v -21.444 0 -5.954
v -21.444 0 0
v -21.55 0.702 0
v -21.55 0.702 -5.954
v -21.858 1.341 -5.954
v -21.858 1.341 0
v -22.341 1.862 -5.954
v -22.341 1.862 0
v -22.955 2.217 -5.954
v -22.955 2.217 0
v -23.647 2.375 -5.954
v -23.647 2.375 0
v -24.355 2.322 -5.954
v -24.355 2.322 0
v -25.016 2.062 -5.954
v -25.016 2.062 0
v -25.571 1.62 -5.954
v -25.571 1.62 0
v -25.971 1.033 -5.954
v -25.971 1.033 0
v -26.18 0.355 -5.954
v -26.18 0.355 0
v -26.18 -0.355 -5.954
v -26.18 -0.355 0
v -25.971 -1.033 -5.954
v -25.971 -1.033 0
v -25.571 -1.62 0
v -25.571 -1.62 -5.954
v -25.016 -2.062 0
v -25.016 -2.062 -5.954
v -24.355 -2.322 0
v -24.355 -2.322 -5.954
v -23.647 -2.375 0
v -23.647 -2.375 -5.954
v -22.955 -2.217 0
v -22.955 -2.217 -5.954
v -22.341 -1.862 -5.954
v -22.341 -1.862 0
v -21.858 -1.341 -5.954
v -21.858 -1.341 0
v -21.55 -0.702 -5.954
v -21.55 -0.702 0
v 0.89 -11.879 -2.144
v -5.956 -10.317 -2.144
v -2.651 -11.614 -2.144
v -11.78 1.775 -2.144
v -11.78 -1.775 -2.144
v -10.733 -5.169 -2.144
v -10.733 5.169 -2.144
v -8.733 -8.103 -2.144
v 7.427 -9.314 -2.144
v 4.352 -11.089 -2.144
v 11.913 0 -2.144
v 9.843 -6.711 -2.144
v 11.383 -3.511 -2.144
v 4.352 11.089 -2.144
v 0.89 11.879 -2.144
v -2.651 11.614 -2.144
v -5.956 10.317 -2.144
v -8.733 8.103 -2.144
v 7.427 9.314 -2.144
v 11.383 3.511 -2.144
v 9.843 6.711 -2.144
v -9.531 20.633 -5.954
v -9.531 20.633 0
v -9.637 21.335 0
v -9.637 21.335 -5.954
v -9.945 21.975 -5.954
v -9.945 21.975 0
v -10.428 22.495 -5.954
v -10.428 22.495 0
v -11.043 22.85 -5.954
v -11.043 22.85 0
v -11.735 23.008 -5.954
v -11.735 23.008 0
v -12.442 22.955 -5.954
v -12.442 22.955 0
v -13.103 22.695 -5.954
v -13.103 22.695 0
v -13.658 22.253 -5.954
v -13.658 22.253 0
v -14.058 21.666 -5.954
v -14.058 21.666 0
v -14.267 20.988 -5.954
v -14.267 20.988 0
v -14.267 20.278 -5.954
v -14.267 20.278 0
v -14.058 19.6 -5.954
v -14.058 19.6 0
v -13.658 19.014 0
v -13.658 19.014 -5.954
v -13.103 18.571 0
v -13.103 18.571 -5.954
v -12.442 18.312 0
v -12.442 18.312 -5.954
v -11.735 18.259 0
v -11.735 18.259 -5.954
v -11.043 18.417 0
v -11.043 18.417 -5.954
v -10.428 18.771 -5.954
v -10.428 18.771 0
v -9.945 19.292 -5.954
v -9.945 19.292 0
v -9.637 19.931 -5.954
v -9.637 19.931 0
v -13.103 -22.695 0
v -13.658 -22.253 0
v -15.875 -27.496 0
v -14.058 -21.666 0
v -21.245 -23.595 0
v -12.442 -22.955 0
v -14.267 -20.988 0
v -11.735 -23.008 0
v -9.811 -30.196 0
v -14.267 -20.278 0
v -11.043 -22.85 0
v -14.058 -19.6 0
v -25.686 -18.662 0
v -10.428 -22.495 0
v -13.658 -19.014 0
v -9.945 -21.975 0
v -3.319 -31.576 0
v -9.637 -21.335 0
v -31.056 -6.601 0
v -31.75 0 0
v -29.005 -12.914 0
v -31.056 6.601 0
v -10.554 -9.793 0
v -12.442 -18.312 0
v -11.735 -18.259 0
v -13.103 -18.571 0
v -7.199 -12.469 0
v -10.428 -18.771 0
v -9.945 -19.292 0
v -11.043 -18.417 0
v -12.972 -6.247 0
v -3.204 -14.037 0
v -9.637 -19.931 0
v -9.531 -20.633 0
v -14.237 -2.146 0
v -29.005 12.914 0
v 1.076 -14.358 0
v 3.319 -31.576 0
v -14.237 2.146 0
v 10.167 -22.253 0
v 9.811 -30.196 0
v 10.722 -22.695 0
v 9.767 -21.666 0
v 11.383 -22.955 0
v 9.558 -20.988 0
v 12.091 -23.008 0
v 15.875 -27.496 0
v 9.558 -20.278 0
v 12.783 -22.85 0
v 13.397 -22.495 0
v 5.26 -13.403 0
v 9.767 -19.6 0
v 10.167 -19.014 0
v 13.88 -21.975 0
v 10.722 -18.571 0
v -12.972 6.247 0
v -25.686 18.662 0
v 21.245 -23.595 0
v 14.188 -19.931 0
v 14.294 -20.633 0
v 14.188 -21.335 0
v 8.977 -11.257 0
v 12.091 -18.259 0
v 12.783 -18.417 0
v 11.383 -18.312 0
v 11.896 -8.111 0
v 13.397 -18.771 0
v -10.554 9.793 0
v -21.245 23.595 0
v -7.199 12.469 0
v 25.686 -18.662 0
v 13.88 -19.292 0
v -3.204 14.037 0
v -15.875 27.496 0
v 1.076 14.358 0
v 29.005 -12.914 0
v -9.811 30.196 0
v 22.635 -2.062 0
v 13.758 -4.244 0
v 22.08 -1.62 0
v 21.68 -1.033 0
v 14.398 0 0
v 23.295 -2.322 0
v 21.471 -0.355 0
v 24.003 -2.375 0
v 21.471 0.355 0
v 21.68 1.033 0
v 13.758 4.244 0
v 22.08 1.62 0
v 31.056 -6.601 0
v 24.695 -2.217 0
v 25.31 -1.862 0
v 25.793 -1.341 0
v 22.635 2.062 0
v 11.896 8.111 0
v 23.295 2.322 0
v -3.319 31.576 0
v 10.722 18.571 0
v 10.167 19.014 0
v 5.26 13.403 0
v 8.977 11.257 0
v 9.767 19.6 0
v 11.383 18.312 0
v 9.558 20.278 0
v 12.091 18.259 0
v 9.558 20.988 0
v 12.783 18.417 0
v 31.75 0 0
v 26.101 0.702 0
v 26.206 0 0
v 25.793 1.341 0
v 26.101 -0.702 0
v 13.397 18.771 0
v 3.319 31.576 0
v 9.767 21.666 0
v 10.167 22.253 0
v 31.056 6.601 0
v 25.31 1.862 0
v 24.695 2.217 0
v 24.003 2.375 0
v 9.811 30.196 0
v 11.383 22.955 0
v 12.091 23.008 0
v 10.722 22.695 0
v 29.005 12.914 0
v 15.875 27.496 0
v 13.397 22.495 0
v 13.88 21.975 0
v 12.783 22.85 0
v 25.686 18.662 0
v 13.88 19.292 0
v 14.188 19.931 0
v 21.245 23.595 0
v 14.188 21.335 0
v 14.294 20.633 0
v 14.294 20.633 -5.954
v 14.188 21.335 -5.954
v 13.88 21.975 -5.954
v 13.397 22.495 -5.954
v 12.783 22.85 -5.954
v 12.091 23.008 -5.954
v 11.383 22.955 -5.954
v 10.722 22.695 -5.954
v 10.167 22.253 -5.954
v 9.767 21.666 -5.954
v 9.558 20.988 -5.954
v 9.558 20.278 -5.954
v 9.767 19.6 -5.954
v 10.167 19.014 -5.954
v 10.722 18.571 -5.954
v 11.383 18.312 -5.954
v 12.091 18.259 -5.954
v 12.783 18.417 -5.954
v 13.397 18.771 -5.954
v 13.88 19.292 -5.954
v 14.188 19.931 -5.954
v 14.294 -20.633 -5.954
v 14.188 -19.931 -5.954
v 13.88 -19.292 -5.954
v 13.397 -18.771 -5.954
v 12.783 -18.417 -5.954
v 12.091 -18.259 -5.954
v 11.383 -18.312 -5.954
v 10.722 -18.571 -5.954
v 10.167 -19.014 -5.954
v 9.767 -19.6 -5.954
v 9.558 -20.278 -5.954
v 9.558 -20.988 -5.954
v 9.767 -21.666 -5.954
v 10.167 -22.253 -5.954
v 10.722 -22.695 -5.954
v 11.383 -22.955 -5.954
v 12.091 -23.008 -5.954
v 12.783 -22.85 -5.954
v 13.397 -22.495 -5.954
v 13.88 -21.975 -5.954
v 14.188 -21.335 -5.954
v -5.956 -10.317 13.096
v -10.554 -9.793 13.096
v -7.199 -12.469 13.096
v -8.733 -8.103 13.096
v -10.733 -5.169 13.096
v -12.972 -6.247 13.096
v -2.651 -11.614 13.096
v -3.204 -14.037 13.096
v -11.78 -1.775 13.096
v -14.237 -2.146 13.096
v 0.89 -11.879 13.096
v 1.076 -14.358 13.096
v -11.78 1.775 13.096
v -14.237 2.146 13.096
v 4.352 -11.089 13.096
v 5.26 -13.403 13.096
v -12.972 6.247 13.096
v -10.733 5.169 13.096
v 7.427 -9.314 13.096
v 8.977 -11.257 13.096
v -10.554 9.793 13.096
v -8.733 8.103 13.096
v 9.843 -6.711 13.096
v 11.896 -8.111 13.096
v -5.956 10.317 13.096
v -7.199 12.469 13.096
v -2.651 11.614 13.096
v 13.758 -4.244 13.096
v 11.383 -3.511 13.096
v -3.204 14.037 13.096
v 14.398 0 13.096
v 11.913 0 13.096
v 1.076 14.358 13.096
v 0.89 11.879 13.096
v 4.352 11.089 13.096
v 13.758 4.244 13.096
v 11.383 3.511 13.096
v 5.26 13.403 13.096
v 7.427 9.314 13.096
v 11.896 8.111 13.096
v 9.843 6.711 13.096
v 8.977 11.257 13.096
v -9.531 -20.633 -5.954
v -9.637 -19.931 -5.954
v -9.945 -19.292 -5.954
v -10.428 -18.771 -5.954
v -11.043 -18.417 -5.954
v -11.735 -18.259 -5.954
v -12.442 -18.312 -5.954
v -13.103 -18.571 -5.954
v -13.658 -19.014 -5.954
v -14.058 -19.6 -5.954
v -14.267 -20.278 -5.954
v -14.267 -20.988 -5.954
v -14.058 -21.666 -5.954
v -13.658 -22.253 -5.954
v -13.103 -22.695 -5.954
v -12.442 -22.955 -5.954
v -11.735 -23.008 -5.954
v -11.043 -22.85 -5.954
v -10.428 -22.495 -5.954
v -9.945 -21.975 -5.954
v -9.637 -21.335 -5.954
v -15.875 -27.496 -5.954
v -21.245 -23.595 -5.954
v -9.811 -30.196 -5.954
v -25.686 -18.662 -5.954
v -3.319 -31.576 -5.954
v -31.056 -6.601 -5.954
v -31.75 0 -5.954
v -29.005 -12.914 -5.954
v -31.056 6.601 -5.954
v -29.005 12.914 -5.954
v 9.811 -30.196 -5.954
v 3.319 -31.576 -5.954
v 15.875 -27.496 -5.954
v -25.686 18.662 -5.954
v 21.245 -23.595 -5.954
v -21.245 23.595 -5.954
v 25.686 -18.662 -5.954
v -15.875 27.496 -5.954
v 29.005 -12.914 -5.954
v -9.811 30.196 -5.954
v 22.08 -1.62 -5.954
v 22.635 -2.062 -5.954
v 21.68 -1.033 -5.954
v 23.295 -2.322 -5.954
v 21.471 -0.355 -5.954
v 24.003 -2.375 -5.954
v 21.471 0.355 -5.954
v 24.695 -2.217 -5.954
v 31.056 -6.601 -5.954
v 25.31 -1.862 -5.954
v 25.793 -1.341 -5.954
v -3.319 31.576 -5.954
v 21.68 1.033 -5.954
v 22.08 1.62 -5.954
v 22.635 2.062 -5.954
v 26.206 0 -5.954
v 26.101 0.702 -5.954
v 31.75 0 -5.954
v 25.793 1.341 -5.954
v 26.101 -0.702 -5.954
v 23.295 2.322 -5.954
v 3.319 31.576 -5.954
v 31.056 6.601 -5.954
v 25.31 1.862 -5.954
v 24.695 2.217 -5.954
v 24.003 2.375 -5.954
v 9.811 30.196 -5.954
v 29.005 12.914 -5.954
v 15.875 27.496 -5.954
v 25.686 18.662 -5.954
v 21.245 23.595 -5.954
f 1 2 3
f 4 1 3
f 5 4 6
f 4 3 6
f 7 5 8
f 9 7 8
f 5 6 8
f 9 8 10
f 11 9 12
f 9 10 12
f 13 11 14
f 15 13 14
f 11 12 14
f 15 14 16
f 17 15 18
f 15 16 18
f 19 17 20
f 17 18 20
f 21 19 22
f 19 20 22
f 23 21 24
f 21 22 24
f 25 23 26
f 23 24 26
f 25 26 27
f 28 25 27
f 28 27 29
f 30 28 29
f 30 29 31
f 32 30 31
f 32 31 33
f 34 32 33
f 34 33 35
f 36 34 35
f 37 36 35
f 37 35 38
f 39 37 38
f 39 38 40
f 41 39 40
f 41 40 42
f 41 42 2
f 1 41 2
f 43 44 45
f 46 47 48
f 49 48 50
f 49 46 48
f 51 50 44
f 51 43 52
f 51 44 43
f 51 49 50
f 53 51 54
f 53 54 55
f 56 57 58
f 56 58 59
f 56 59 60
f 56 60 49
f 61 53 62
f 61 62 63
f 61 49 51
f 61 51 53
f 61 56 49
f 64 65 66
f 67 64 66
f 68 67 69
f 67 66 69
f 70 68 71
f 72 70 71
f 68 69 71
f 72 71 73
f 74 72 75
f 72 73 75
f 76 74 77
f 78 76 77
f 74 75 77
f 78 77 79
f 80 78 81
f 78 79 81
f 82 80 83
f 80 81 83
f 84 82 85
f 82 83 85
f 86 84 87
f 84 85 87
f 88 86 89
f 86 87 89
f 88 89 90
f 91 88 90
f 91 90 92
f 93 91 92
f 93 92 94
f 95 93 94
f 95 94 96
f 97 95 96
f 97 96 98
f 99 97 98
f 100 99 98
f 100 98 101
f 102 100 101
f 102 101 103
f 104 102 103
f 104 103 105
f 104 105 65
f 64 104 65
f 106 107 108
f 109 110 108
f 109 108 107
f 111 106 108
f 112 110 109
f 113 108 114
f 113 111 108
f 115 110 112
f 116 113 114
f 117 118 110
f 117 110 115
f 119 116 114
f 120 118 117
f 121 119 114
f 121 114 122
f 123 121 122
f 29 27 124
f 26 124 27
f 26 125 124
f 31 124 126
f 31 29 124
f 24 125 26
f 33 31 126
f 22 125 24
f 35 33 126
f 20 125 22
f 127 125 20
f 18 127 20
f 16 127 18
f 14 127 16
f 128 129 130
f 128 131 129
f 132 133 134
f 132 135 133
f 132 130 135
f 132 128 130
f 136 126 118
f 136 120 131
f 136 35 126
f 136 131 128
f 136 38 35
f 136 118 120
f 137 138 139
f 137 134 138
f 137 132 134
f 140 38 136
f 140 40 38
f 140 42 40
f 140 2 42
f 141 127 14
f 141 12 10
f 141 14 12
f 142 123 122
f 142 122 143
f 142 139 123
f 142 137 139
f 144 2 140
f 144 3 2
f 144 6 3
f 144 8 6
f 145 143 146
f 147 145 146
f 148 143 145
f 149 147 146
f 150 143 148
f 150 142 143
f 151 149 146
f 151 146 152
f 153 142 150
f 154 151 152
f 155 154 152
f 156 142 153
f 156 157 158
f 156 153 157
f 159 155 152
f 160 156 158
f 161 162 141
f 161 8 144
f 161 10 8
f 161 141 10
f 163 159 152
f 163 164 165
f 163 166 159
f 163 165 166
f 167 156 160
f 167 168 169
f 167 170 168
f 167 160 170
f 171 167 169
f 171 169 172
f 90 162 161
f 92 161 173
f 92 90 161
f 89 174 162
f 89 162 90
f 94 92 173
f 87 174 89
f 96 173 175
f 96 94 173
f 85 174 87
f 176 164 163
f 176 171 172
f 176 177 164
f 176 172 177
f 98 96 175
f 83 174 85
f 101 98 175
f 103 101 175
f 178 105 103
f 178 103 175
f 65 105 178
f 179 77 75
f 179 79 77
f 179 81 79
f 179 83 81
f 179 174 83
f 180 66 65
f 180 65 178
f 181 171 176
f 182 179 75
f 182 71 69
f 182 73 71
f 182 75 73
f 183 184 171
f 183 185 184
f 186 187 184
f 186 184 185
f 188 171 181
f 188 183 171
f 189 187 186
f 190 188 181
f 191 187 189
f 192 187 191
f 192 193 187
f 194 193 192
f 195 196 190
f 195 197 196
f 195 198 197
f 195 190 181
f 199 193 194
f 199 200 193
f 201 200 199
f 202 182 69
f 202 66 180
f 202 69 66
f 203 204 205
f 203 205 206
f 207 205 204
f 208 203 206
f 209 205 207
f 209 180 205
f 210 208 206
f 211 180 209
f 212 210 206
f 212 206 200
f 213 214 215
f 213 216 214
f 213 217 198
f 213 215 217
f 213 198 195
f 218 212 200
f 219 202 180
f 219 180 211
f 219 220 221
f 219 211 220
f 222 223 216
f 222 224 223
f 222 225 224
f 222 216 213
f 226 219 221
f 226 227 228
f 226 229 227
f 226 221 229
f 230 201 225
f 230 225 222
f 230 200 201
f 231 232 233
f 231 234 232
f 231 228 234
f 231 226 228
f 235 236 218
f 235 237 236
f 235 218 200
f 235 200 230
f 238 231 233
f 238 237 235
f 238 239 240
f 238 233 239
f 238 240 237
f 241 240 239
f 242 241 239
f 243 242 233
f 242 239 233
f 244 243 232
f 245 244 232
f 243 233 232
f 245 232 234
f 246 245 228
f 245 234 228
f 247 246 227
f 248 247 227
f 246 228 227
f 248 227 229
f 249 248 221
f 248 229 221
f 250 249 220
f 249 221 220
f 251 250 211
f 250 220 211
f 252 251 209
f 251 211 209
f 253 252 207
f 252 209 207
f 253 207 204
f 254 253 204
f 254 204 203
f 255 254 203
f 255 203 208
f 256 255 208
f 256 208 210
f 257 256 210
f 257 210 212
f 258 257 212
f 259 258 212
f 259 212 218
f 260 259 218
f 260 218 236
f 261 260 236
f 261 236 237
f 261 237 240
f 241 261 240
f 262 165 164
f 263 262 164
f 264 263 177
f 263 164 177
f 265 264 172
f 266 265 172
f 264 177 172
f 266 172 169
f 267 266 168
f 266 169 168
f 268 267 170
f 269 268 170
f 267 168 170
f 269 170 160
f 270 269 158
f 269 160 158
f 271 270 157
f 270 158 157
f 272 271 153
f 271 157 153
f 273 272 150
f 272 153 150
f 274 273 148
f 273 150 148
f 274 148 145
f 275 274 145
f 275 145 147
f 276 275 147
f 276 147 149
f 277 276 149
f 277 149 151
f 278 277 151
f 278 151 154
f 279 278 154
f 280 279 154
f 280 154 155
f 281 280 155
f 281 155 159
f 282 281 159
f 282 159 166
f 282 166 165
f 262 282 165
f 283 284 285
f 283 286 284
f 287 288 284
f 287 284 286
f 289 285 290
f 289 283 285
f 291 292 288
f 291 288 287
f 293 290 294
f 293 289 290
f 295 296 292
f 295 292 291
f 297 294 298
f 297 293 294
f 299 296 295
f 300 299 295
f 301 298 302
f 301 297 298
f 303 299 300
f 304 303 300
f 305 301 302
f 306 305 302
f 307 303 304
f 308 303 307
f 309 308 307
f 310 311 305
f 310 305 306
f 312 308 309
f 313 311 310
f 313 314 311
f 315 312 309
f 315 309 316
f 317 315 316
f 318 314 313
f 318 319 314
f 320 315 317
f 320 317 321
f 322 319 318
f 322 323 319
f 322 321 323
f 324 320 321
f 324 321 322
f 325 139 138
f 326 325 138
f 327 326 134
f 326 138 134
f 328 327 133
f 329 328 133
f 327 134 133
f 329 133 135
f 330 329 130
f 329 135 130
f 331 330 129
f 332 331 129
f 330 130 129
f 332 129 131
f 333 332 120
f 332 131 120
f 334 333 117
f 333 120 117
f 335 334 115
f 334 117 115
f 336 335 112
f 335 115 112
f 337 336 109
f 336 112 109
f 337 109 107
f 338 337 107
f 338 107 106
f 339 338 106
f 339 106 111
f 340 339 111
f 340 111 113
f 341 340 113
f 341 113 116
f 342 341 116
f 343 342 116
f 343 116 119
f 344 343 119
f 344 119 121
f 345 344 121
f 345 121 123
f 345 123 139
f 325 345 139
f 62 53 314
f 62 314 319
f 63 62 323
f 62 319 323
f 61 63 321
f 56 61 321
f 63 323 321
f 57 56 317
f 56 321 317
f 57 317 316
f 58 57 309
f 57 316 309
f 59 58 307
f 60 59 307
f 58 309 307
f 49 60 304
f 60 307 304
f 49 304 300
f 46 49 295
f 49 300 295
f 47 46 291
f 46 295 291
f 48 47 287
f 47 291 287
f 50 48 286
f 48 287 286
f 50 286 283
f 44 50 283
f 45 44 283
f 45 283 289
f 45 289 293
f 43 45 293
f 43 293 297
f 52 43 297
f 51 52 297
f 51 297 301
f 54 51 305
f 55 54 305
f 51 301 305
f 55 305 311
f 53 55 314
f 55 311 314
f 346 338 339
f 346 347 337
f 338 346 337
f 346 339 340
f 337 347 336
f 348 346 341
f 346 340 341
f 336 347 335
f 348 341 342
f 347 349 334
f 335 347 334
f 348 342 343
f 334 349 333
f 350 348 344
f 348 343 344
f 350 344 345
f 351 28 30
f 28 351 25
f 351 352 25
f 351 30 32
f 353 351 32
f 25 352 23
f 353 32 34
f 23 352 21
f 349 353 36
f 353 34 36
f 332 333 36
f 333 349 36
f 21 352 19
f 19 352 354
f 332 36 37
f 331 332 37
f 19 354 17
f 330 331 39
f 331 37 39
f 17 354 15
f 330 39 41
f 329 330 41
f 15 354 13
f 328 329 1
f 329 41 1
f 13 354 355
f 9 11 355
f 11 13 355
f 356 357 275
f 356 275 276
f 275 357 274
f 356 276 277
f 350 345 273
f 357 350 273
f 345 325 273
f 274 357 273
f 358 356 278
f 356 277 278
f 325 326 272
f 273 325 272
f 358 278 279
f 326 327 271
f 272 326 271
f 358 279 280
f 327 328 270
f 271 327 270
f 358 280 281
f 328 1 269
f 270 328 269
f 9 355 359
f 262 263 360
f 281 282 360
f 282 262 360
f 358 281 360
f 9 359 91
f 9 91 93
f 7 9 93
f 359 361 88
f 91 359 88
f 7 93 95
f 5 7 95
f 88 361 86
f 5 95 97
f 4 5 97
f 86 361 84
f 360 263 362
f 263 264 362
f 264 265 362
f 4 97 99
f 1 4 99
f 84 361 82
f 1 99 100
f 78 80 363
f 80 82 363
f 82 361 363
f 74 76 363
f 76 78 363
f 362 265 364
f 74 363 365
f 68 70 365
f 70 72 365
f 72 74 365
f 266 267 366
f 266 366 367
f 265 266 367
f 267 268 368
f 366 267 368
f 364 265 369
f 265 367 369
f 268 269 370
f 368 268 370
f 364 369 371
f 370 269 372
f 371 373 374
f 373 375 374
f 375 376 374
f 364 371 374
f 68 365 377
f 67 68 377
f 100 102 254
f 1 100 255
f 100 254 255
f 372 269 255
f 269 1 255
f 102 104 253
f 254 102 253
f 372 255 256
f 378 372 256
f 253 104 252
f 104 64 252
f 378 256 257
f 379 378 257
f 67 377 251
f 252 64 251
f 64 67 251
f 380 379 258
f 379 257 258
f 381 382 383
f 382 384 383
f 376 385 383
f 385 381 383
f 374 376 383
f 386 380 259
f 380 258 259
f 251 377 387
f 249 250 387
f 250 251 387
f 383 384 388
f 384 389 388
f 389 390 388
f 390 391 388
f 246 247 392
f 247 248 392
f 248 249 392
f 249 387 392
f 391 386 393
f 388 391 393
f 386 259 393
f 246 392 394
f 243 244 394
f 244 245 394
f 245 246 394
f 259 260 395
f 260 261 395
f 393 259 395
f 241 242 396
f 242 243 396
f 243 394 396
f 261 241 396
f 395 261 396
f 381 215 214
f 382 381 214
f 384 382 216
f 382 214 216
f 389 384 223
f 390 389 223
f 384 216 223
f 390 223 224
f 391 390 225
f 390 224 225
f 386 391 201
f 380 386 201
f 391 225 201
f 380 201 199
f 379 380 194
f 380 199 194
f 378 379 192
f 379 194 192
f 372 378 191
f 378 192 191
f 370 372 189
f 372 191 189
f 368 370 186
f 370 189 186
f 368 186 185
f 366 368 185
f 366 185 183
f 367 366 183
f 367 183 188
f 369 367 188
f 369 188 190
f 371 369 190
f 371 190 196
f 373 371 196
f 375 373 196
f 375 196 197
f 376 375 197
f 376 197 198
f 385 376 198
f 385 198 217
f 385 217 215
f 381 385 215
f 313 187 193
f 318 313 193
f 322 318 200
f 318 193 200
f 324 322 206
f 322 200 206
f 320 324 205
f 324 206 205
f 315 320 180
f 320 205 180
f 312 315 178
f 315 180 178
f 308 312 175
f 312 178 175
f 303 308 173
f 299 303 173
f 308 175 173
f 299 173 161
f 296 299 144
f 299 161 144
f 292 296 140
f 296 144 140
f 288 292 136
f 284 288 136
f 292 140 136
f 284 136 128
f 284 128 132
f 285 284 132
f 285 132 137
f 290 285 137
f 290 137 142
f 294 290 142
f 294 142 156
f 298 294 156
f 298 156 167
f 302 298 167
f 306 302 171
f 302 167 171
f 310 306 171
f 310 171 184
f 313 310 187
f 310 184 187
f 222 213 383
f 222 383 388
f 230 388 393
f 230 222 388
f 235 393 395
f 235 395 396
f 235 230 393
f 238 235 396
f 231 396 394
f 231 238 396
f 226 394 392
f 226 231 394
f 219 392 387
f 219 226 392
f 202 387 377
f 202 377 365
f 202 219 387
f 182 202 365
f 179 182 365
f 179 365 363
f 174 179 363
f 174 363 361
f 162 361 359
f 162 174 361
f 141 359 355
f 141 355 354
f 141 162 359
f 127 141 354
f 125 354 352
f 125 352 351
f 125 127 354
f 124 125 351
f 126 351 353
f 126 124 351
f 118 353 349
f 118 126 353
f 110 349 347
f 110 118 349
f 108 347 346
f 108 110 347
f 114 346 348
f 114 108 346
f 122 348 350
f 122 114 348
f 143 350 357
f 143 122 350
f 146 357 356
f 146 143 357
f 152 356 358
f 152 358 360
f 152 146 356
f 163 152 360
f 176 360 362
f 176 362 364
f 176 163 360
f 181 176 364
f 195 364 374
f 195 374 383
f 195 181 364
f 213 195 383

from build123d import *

# Parameters (mm, degrees)
F0_R     = 31.75
F1_DEPTH = 5.95376
F2_R     = 14.39799
F3_DEPTH = 13.09624
F5_R     = 2.38125
F6_DEPTH = 5.95476
F4_R     = 11.9126
F7_DEPTH = 15.24


with BuildPart() as f1:
    # F0 (on Top) → F1 (new body)
    with BuildSketch(Plane.XY):
        Circle(F0_R)
    extrude(amount=-F1_DEPTH)

    # F2 (on face) → F3 (join)
    with BuildSketch(Plane.XY):
        Circle(F2_R)
    extrude(amount=F3_DEPTH)

    # F5 (on face) → F6 (cut, through all)
    with BuildSketch(Plane.XY):
        with Locations((-23.8252, 0)):
            Circle(F5_R)
        with Locations((-11.9126, 20.633228)):
            Circle(F5_R)
        with Locations((11.9126, 20.633228)):
            Circle(F5_R)
        with Locations((23.8252, 0)):
            Circle(F5_R)
        with Locations((11.9126, -20.633228)):
            Circle(F5_R)
        with Locations((-11.9126, -20.633228)):
            Circle(F5_R)
    extrude(amount=-F6_DEPTH, mode=Mode.SUBTRACT)

    # F4 (on face) → F7 (cut)
    with BuildSketch(Plane.XY.offset(13.09624)):
        Circle(F4_R)
    extrude(amount=-F7_DEPTH, mode=Mode.SUBTRACT)


solid = f1.part
